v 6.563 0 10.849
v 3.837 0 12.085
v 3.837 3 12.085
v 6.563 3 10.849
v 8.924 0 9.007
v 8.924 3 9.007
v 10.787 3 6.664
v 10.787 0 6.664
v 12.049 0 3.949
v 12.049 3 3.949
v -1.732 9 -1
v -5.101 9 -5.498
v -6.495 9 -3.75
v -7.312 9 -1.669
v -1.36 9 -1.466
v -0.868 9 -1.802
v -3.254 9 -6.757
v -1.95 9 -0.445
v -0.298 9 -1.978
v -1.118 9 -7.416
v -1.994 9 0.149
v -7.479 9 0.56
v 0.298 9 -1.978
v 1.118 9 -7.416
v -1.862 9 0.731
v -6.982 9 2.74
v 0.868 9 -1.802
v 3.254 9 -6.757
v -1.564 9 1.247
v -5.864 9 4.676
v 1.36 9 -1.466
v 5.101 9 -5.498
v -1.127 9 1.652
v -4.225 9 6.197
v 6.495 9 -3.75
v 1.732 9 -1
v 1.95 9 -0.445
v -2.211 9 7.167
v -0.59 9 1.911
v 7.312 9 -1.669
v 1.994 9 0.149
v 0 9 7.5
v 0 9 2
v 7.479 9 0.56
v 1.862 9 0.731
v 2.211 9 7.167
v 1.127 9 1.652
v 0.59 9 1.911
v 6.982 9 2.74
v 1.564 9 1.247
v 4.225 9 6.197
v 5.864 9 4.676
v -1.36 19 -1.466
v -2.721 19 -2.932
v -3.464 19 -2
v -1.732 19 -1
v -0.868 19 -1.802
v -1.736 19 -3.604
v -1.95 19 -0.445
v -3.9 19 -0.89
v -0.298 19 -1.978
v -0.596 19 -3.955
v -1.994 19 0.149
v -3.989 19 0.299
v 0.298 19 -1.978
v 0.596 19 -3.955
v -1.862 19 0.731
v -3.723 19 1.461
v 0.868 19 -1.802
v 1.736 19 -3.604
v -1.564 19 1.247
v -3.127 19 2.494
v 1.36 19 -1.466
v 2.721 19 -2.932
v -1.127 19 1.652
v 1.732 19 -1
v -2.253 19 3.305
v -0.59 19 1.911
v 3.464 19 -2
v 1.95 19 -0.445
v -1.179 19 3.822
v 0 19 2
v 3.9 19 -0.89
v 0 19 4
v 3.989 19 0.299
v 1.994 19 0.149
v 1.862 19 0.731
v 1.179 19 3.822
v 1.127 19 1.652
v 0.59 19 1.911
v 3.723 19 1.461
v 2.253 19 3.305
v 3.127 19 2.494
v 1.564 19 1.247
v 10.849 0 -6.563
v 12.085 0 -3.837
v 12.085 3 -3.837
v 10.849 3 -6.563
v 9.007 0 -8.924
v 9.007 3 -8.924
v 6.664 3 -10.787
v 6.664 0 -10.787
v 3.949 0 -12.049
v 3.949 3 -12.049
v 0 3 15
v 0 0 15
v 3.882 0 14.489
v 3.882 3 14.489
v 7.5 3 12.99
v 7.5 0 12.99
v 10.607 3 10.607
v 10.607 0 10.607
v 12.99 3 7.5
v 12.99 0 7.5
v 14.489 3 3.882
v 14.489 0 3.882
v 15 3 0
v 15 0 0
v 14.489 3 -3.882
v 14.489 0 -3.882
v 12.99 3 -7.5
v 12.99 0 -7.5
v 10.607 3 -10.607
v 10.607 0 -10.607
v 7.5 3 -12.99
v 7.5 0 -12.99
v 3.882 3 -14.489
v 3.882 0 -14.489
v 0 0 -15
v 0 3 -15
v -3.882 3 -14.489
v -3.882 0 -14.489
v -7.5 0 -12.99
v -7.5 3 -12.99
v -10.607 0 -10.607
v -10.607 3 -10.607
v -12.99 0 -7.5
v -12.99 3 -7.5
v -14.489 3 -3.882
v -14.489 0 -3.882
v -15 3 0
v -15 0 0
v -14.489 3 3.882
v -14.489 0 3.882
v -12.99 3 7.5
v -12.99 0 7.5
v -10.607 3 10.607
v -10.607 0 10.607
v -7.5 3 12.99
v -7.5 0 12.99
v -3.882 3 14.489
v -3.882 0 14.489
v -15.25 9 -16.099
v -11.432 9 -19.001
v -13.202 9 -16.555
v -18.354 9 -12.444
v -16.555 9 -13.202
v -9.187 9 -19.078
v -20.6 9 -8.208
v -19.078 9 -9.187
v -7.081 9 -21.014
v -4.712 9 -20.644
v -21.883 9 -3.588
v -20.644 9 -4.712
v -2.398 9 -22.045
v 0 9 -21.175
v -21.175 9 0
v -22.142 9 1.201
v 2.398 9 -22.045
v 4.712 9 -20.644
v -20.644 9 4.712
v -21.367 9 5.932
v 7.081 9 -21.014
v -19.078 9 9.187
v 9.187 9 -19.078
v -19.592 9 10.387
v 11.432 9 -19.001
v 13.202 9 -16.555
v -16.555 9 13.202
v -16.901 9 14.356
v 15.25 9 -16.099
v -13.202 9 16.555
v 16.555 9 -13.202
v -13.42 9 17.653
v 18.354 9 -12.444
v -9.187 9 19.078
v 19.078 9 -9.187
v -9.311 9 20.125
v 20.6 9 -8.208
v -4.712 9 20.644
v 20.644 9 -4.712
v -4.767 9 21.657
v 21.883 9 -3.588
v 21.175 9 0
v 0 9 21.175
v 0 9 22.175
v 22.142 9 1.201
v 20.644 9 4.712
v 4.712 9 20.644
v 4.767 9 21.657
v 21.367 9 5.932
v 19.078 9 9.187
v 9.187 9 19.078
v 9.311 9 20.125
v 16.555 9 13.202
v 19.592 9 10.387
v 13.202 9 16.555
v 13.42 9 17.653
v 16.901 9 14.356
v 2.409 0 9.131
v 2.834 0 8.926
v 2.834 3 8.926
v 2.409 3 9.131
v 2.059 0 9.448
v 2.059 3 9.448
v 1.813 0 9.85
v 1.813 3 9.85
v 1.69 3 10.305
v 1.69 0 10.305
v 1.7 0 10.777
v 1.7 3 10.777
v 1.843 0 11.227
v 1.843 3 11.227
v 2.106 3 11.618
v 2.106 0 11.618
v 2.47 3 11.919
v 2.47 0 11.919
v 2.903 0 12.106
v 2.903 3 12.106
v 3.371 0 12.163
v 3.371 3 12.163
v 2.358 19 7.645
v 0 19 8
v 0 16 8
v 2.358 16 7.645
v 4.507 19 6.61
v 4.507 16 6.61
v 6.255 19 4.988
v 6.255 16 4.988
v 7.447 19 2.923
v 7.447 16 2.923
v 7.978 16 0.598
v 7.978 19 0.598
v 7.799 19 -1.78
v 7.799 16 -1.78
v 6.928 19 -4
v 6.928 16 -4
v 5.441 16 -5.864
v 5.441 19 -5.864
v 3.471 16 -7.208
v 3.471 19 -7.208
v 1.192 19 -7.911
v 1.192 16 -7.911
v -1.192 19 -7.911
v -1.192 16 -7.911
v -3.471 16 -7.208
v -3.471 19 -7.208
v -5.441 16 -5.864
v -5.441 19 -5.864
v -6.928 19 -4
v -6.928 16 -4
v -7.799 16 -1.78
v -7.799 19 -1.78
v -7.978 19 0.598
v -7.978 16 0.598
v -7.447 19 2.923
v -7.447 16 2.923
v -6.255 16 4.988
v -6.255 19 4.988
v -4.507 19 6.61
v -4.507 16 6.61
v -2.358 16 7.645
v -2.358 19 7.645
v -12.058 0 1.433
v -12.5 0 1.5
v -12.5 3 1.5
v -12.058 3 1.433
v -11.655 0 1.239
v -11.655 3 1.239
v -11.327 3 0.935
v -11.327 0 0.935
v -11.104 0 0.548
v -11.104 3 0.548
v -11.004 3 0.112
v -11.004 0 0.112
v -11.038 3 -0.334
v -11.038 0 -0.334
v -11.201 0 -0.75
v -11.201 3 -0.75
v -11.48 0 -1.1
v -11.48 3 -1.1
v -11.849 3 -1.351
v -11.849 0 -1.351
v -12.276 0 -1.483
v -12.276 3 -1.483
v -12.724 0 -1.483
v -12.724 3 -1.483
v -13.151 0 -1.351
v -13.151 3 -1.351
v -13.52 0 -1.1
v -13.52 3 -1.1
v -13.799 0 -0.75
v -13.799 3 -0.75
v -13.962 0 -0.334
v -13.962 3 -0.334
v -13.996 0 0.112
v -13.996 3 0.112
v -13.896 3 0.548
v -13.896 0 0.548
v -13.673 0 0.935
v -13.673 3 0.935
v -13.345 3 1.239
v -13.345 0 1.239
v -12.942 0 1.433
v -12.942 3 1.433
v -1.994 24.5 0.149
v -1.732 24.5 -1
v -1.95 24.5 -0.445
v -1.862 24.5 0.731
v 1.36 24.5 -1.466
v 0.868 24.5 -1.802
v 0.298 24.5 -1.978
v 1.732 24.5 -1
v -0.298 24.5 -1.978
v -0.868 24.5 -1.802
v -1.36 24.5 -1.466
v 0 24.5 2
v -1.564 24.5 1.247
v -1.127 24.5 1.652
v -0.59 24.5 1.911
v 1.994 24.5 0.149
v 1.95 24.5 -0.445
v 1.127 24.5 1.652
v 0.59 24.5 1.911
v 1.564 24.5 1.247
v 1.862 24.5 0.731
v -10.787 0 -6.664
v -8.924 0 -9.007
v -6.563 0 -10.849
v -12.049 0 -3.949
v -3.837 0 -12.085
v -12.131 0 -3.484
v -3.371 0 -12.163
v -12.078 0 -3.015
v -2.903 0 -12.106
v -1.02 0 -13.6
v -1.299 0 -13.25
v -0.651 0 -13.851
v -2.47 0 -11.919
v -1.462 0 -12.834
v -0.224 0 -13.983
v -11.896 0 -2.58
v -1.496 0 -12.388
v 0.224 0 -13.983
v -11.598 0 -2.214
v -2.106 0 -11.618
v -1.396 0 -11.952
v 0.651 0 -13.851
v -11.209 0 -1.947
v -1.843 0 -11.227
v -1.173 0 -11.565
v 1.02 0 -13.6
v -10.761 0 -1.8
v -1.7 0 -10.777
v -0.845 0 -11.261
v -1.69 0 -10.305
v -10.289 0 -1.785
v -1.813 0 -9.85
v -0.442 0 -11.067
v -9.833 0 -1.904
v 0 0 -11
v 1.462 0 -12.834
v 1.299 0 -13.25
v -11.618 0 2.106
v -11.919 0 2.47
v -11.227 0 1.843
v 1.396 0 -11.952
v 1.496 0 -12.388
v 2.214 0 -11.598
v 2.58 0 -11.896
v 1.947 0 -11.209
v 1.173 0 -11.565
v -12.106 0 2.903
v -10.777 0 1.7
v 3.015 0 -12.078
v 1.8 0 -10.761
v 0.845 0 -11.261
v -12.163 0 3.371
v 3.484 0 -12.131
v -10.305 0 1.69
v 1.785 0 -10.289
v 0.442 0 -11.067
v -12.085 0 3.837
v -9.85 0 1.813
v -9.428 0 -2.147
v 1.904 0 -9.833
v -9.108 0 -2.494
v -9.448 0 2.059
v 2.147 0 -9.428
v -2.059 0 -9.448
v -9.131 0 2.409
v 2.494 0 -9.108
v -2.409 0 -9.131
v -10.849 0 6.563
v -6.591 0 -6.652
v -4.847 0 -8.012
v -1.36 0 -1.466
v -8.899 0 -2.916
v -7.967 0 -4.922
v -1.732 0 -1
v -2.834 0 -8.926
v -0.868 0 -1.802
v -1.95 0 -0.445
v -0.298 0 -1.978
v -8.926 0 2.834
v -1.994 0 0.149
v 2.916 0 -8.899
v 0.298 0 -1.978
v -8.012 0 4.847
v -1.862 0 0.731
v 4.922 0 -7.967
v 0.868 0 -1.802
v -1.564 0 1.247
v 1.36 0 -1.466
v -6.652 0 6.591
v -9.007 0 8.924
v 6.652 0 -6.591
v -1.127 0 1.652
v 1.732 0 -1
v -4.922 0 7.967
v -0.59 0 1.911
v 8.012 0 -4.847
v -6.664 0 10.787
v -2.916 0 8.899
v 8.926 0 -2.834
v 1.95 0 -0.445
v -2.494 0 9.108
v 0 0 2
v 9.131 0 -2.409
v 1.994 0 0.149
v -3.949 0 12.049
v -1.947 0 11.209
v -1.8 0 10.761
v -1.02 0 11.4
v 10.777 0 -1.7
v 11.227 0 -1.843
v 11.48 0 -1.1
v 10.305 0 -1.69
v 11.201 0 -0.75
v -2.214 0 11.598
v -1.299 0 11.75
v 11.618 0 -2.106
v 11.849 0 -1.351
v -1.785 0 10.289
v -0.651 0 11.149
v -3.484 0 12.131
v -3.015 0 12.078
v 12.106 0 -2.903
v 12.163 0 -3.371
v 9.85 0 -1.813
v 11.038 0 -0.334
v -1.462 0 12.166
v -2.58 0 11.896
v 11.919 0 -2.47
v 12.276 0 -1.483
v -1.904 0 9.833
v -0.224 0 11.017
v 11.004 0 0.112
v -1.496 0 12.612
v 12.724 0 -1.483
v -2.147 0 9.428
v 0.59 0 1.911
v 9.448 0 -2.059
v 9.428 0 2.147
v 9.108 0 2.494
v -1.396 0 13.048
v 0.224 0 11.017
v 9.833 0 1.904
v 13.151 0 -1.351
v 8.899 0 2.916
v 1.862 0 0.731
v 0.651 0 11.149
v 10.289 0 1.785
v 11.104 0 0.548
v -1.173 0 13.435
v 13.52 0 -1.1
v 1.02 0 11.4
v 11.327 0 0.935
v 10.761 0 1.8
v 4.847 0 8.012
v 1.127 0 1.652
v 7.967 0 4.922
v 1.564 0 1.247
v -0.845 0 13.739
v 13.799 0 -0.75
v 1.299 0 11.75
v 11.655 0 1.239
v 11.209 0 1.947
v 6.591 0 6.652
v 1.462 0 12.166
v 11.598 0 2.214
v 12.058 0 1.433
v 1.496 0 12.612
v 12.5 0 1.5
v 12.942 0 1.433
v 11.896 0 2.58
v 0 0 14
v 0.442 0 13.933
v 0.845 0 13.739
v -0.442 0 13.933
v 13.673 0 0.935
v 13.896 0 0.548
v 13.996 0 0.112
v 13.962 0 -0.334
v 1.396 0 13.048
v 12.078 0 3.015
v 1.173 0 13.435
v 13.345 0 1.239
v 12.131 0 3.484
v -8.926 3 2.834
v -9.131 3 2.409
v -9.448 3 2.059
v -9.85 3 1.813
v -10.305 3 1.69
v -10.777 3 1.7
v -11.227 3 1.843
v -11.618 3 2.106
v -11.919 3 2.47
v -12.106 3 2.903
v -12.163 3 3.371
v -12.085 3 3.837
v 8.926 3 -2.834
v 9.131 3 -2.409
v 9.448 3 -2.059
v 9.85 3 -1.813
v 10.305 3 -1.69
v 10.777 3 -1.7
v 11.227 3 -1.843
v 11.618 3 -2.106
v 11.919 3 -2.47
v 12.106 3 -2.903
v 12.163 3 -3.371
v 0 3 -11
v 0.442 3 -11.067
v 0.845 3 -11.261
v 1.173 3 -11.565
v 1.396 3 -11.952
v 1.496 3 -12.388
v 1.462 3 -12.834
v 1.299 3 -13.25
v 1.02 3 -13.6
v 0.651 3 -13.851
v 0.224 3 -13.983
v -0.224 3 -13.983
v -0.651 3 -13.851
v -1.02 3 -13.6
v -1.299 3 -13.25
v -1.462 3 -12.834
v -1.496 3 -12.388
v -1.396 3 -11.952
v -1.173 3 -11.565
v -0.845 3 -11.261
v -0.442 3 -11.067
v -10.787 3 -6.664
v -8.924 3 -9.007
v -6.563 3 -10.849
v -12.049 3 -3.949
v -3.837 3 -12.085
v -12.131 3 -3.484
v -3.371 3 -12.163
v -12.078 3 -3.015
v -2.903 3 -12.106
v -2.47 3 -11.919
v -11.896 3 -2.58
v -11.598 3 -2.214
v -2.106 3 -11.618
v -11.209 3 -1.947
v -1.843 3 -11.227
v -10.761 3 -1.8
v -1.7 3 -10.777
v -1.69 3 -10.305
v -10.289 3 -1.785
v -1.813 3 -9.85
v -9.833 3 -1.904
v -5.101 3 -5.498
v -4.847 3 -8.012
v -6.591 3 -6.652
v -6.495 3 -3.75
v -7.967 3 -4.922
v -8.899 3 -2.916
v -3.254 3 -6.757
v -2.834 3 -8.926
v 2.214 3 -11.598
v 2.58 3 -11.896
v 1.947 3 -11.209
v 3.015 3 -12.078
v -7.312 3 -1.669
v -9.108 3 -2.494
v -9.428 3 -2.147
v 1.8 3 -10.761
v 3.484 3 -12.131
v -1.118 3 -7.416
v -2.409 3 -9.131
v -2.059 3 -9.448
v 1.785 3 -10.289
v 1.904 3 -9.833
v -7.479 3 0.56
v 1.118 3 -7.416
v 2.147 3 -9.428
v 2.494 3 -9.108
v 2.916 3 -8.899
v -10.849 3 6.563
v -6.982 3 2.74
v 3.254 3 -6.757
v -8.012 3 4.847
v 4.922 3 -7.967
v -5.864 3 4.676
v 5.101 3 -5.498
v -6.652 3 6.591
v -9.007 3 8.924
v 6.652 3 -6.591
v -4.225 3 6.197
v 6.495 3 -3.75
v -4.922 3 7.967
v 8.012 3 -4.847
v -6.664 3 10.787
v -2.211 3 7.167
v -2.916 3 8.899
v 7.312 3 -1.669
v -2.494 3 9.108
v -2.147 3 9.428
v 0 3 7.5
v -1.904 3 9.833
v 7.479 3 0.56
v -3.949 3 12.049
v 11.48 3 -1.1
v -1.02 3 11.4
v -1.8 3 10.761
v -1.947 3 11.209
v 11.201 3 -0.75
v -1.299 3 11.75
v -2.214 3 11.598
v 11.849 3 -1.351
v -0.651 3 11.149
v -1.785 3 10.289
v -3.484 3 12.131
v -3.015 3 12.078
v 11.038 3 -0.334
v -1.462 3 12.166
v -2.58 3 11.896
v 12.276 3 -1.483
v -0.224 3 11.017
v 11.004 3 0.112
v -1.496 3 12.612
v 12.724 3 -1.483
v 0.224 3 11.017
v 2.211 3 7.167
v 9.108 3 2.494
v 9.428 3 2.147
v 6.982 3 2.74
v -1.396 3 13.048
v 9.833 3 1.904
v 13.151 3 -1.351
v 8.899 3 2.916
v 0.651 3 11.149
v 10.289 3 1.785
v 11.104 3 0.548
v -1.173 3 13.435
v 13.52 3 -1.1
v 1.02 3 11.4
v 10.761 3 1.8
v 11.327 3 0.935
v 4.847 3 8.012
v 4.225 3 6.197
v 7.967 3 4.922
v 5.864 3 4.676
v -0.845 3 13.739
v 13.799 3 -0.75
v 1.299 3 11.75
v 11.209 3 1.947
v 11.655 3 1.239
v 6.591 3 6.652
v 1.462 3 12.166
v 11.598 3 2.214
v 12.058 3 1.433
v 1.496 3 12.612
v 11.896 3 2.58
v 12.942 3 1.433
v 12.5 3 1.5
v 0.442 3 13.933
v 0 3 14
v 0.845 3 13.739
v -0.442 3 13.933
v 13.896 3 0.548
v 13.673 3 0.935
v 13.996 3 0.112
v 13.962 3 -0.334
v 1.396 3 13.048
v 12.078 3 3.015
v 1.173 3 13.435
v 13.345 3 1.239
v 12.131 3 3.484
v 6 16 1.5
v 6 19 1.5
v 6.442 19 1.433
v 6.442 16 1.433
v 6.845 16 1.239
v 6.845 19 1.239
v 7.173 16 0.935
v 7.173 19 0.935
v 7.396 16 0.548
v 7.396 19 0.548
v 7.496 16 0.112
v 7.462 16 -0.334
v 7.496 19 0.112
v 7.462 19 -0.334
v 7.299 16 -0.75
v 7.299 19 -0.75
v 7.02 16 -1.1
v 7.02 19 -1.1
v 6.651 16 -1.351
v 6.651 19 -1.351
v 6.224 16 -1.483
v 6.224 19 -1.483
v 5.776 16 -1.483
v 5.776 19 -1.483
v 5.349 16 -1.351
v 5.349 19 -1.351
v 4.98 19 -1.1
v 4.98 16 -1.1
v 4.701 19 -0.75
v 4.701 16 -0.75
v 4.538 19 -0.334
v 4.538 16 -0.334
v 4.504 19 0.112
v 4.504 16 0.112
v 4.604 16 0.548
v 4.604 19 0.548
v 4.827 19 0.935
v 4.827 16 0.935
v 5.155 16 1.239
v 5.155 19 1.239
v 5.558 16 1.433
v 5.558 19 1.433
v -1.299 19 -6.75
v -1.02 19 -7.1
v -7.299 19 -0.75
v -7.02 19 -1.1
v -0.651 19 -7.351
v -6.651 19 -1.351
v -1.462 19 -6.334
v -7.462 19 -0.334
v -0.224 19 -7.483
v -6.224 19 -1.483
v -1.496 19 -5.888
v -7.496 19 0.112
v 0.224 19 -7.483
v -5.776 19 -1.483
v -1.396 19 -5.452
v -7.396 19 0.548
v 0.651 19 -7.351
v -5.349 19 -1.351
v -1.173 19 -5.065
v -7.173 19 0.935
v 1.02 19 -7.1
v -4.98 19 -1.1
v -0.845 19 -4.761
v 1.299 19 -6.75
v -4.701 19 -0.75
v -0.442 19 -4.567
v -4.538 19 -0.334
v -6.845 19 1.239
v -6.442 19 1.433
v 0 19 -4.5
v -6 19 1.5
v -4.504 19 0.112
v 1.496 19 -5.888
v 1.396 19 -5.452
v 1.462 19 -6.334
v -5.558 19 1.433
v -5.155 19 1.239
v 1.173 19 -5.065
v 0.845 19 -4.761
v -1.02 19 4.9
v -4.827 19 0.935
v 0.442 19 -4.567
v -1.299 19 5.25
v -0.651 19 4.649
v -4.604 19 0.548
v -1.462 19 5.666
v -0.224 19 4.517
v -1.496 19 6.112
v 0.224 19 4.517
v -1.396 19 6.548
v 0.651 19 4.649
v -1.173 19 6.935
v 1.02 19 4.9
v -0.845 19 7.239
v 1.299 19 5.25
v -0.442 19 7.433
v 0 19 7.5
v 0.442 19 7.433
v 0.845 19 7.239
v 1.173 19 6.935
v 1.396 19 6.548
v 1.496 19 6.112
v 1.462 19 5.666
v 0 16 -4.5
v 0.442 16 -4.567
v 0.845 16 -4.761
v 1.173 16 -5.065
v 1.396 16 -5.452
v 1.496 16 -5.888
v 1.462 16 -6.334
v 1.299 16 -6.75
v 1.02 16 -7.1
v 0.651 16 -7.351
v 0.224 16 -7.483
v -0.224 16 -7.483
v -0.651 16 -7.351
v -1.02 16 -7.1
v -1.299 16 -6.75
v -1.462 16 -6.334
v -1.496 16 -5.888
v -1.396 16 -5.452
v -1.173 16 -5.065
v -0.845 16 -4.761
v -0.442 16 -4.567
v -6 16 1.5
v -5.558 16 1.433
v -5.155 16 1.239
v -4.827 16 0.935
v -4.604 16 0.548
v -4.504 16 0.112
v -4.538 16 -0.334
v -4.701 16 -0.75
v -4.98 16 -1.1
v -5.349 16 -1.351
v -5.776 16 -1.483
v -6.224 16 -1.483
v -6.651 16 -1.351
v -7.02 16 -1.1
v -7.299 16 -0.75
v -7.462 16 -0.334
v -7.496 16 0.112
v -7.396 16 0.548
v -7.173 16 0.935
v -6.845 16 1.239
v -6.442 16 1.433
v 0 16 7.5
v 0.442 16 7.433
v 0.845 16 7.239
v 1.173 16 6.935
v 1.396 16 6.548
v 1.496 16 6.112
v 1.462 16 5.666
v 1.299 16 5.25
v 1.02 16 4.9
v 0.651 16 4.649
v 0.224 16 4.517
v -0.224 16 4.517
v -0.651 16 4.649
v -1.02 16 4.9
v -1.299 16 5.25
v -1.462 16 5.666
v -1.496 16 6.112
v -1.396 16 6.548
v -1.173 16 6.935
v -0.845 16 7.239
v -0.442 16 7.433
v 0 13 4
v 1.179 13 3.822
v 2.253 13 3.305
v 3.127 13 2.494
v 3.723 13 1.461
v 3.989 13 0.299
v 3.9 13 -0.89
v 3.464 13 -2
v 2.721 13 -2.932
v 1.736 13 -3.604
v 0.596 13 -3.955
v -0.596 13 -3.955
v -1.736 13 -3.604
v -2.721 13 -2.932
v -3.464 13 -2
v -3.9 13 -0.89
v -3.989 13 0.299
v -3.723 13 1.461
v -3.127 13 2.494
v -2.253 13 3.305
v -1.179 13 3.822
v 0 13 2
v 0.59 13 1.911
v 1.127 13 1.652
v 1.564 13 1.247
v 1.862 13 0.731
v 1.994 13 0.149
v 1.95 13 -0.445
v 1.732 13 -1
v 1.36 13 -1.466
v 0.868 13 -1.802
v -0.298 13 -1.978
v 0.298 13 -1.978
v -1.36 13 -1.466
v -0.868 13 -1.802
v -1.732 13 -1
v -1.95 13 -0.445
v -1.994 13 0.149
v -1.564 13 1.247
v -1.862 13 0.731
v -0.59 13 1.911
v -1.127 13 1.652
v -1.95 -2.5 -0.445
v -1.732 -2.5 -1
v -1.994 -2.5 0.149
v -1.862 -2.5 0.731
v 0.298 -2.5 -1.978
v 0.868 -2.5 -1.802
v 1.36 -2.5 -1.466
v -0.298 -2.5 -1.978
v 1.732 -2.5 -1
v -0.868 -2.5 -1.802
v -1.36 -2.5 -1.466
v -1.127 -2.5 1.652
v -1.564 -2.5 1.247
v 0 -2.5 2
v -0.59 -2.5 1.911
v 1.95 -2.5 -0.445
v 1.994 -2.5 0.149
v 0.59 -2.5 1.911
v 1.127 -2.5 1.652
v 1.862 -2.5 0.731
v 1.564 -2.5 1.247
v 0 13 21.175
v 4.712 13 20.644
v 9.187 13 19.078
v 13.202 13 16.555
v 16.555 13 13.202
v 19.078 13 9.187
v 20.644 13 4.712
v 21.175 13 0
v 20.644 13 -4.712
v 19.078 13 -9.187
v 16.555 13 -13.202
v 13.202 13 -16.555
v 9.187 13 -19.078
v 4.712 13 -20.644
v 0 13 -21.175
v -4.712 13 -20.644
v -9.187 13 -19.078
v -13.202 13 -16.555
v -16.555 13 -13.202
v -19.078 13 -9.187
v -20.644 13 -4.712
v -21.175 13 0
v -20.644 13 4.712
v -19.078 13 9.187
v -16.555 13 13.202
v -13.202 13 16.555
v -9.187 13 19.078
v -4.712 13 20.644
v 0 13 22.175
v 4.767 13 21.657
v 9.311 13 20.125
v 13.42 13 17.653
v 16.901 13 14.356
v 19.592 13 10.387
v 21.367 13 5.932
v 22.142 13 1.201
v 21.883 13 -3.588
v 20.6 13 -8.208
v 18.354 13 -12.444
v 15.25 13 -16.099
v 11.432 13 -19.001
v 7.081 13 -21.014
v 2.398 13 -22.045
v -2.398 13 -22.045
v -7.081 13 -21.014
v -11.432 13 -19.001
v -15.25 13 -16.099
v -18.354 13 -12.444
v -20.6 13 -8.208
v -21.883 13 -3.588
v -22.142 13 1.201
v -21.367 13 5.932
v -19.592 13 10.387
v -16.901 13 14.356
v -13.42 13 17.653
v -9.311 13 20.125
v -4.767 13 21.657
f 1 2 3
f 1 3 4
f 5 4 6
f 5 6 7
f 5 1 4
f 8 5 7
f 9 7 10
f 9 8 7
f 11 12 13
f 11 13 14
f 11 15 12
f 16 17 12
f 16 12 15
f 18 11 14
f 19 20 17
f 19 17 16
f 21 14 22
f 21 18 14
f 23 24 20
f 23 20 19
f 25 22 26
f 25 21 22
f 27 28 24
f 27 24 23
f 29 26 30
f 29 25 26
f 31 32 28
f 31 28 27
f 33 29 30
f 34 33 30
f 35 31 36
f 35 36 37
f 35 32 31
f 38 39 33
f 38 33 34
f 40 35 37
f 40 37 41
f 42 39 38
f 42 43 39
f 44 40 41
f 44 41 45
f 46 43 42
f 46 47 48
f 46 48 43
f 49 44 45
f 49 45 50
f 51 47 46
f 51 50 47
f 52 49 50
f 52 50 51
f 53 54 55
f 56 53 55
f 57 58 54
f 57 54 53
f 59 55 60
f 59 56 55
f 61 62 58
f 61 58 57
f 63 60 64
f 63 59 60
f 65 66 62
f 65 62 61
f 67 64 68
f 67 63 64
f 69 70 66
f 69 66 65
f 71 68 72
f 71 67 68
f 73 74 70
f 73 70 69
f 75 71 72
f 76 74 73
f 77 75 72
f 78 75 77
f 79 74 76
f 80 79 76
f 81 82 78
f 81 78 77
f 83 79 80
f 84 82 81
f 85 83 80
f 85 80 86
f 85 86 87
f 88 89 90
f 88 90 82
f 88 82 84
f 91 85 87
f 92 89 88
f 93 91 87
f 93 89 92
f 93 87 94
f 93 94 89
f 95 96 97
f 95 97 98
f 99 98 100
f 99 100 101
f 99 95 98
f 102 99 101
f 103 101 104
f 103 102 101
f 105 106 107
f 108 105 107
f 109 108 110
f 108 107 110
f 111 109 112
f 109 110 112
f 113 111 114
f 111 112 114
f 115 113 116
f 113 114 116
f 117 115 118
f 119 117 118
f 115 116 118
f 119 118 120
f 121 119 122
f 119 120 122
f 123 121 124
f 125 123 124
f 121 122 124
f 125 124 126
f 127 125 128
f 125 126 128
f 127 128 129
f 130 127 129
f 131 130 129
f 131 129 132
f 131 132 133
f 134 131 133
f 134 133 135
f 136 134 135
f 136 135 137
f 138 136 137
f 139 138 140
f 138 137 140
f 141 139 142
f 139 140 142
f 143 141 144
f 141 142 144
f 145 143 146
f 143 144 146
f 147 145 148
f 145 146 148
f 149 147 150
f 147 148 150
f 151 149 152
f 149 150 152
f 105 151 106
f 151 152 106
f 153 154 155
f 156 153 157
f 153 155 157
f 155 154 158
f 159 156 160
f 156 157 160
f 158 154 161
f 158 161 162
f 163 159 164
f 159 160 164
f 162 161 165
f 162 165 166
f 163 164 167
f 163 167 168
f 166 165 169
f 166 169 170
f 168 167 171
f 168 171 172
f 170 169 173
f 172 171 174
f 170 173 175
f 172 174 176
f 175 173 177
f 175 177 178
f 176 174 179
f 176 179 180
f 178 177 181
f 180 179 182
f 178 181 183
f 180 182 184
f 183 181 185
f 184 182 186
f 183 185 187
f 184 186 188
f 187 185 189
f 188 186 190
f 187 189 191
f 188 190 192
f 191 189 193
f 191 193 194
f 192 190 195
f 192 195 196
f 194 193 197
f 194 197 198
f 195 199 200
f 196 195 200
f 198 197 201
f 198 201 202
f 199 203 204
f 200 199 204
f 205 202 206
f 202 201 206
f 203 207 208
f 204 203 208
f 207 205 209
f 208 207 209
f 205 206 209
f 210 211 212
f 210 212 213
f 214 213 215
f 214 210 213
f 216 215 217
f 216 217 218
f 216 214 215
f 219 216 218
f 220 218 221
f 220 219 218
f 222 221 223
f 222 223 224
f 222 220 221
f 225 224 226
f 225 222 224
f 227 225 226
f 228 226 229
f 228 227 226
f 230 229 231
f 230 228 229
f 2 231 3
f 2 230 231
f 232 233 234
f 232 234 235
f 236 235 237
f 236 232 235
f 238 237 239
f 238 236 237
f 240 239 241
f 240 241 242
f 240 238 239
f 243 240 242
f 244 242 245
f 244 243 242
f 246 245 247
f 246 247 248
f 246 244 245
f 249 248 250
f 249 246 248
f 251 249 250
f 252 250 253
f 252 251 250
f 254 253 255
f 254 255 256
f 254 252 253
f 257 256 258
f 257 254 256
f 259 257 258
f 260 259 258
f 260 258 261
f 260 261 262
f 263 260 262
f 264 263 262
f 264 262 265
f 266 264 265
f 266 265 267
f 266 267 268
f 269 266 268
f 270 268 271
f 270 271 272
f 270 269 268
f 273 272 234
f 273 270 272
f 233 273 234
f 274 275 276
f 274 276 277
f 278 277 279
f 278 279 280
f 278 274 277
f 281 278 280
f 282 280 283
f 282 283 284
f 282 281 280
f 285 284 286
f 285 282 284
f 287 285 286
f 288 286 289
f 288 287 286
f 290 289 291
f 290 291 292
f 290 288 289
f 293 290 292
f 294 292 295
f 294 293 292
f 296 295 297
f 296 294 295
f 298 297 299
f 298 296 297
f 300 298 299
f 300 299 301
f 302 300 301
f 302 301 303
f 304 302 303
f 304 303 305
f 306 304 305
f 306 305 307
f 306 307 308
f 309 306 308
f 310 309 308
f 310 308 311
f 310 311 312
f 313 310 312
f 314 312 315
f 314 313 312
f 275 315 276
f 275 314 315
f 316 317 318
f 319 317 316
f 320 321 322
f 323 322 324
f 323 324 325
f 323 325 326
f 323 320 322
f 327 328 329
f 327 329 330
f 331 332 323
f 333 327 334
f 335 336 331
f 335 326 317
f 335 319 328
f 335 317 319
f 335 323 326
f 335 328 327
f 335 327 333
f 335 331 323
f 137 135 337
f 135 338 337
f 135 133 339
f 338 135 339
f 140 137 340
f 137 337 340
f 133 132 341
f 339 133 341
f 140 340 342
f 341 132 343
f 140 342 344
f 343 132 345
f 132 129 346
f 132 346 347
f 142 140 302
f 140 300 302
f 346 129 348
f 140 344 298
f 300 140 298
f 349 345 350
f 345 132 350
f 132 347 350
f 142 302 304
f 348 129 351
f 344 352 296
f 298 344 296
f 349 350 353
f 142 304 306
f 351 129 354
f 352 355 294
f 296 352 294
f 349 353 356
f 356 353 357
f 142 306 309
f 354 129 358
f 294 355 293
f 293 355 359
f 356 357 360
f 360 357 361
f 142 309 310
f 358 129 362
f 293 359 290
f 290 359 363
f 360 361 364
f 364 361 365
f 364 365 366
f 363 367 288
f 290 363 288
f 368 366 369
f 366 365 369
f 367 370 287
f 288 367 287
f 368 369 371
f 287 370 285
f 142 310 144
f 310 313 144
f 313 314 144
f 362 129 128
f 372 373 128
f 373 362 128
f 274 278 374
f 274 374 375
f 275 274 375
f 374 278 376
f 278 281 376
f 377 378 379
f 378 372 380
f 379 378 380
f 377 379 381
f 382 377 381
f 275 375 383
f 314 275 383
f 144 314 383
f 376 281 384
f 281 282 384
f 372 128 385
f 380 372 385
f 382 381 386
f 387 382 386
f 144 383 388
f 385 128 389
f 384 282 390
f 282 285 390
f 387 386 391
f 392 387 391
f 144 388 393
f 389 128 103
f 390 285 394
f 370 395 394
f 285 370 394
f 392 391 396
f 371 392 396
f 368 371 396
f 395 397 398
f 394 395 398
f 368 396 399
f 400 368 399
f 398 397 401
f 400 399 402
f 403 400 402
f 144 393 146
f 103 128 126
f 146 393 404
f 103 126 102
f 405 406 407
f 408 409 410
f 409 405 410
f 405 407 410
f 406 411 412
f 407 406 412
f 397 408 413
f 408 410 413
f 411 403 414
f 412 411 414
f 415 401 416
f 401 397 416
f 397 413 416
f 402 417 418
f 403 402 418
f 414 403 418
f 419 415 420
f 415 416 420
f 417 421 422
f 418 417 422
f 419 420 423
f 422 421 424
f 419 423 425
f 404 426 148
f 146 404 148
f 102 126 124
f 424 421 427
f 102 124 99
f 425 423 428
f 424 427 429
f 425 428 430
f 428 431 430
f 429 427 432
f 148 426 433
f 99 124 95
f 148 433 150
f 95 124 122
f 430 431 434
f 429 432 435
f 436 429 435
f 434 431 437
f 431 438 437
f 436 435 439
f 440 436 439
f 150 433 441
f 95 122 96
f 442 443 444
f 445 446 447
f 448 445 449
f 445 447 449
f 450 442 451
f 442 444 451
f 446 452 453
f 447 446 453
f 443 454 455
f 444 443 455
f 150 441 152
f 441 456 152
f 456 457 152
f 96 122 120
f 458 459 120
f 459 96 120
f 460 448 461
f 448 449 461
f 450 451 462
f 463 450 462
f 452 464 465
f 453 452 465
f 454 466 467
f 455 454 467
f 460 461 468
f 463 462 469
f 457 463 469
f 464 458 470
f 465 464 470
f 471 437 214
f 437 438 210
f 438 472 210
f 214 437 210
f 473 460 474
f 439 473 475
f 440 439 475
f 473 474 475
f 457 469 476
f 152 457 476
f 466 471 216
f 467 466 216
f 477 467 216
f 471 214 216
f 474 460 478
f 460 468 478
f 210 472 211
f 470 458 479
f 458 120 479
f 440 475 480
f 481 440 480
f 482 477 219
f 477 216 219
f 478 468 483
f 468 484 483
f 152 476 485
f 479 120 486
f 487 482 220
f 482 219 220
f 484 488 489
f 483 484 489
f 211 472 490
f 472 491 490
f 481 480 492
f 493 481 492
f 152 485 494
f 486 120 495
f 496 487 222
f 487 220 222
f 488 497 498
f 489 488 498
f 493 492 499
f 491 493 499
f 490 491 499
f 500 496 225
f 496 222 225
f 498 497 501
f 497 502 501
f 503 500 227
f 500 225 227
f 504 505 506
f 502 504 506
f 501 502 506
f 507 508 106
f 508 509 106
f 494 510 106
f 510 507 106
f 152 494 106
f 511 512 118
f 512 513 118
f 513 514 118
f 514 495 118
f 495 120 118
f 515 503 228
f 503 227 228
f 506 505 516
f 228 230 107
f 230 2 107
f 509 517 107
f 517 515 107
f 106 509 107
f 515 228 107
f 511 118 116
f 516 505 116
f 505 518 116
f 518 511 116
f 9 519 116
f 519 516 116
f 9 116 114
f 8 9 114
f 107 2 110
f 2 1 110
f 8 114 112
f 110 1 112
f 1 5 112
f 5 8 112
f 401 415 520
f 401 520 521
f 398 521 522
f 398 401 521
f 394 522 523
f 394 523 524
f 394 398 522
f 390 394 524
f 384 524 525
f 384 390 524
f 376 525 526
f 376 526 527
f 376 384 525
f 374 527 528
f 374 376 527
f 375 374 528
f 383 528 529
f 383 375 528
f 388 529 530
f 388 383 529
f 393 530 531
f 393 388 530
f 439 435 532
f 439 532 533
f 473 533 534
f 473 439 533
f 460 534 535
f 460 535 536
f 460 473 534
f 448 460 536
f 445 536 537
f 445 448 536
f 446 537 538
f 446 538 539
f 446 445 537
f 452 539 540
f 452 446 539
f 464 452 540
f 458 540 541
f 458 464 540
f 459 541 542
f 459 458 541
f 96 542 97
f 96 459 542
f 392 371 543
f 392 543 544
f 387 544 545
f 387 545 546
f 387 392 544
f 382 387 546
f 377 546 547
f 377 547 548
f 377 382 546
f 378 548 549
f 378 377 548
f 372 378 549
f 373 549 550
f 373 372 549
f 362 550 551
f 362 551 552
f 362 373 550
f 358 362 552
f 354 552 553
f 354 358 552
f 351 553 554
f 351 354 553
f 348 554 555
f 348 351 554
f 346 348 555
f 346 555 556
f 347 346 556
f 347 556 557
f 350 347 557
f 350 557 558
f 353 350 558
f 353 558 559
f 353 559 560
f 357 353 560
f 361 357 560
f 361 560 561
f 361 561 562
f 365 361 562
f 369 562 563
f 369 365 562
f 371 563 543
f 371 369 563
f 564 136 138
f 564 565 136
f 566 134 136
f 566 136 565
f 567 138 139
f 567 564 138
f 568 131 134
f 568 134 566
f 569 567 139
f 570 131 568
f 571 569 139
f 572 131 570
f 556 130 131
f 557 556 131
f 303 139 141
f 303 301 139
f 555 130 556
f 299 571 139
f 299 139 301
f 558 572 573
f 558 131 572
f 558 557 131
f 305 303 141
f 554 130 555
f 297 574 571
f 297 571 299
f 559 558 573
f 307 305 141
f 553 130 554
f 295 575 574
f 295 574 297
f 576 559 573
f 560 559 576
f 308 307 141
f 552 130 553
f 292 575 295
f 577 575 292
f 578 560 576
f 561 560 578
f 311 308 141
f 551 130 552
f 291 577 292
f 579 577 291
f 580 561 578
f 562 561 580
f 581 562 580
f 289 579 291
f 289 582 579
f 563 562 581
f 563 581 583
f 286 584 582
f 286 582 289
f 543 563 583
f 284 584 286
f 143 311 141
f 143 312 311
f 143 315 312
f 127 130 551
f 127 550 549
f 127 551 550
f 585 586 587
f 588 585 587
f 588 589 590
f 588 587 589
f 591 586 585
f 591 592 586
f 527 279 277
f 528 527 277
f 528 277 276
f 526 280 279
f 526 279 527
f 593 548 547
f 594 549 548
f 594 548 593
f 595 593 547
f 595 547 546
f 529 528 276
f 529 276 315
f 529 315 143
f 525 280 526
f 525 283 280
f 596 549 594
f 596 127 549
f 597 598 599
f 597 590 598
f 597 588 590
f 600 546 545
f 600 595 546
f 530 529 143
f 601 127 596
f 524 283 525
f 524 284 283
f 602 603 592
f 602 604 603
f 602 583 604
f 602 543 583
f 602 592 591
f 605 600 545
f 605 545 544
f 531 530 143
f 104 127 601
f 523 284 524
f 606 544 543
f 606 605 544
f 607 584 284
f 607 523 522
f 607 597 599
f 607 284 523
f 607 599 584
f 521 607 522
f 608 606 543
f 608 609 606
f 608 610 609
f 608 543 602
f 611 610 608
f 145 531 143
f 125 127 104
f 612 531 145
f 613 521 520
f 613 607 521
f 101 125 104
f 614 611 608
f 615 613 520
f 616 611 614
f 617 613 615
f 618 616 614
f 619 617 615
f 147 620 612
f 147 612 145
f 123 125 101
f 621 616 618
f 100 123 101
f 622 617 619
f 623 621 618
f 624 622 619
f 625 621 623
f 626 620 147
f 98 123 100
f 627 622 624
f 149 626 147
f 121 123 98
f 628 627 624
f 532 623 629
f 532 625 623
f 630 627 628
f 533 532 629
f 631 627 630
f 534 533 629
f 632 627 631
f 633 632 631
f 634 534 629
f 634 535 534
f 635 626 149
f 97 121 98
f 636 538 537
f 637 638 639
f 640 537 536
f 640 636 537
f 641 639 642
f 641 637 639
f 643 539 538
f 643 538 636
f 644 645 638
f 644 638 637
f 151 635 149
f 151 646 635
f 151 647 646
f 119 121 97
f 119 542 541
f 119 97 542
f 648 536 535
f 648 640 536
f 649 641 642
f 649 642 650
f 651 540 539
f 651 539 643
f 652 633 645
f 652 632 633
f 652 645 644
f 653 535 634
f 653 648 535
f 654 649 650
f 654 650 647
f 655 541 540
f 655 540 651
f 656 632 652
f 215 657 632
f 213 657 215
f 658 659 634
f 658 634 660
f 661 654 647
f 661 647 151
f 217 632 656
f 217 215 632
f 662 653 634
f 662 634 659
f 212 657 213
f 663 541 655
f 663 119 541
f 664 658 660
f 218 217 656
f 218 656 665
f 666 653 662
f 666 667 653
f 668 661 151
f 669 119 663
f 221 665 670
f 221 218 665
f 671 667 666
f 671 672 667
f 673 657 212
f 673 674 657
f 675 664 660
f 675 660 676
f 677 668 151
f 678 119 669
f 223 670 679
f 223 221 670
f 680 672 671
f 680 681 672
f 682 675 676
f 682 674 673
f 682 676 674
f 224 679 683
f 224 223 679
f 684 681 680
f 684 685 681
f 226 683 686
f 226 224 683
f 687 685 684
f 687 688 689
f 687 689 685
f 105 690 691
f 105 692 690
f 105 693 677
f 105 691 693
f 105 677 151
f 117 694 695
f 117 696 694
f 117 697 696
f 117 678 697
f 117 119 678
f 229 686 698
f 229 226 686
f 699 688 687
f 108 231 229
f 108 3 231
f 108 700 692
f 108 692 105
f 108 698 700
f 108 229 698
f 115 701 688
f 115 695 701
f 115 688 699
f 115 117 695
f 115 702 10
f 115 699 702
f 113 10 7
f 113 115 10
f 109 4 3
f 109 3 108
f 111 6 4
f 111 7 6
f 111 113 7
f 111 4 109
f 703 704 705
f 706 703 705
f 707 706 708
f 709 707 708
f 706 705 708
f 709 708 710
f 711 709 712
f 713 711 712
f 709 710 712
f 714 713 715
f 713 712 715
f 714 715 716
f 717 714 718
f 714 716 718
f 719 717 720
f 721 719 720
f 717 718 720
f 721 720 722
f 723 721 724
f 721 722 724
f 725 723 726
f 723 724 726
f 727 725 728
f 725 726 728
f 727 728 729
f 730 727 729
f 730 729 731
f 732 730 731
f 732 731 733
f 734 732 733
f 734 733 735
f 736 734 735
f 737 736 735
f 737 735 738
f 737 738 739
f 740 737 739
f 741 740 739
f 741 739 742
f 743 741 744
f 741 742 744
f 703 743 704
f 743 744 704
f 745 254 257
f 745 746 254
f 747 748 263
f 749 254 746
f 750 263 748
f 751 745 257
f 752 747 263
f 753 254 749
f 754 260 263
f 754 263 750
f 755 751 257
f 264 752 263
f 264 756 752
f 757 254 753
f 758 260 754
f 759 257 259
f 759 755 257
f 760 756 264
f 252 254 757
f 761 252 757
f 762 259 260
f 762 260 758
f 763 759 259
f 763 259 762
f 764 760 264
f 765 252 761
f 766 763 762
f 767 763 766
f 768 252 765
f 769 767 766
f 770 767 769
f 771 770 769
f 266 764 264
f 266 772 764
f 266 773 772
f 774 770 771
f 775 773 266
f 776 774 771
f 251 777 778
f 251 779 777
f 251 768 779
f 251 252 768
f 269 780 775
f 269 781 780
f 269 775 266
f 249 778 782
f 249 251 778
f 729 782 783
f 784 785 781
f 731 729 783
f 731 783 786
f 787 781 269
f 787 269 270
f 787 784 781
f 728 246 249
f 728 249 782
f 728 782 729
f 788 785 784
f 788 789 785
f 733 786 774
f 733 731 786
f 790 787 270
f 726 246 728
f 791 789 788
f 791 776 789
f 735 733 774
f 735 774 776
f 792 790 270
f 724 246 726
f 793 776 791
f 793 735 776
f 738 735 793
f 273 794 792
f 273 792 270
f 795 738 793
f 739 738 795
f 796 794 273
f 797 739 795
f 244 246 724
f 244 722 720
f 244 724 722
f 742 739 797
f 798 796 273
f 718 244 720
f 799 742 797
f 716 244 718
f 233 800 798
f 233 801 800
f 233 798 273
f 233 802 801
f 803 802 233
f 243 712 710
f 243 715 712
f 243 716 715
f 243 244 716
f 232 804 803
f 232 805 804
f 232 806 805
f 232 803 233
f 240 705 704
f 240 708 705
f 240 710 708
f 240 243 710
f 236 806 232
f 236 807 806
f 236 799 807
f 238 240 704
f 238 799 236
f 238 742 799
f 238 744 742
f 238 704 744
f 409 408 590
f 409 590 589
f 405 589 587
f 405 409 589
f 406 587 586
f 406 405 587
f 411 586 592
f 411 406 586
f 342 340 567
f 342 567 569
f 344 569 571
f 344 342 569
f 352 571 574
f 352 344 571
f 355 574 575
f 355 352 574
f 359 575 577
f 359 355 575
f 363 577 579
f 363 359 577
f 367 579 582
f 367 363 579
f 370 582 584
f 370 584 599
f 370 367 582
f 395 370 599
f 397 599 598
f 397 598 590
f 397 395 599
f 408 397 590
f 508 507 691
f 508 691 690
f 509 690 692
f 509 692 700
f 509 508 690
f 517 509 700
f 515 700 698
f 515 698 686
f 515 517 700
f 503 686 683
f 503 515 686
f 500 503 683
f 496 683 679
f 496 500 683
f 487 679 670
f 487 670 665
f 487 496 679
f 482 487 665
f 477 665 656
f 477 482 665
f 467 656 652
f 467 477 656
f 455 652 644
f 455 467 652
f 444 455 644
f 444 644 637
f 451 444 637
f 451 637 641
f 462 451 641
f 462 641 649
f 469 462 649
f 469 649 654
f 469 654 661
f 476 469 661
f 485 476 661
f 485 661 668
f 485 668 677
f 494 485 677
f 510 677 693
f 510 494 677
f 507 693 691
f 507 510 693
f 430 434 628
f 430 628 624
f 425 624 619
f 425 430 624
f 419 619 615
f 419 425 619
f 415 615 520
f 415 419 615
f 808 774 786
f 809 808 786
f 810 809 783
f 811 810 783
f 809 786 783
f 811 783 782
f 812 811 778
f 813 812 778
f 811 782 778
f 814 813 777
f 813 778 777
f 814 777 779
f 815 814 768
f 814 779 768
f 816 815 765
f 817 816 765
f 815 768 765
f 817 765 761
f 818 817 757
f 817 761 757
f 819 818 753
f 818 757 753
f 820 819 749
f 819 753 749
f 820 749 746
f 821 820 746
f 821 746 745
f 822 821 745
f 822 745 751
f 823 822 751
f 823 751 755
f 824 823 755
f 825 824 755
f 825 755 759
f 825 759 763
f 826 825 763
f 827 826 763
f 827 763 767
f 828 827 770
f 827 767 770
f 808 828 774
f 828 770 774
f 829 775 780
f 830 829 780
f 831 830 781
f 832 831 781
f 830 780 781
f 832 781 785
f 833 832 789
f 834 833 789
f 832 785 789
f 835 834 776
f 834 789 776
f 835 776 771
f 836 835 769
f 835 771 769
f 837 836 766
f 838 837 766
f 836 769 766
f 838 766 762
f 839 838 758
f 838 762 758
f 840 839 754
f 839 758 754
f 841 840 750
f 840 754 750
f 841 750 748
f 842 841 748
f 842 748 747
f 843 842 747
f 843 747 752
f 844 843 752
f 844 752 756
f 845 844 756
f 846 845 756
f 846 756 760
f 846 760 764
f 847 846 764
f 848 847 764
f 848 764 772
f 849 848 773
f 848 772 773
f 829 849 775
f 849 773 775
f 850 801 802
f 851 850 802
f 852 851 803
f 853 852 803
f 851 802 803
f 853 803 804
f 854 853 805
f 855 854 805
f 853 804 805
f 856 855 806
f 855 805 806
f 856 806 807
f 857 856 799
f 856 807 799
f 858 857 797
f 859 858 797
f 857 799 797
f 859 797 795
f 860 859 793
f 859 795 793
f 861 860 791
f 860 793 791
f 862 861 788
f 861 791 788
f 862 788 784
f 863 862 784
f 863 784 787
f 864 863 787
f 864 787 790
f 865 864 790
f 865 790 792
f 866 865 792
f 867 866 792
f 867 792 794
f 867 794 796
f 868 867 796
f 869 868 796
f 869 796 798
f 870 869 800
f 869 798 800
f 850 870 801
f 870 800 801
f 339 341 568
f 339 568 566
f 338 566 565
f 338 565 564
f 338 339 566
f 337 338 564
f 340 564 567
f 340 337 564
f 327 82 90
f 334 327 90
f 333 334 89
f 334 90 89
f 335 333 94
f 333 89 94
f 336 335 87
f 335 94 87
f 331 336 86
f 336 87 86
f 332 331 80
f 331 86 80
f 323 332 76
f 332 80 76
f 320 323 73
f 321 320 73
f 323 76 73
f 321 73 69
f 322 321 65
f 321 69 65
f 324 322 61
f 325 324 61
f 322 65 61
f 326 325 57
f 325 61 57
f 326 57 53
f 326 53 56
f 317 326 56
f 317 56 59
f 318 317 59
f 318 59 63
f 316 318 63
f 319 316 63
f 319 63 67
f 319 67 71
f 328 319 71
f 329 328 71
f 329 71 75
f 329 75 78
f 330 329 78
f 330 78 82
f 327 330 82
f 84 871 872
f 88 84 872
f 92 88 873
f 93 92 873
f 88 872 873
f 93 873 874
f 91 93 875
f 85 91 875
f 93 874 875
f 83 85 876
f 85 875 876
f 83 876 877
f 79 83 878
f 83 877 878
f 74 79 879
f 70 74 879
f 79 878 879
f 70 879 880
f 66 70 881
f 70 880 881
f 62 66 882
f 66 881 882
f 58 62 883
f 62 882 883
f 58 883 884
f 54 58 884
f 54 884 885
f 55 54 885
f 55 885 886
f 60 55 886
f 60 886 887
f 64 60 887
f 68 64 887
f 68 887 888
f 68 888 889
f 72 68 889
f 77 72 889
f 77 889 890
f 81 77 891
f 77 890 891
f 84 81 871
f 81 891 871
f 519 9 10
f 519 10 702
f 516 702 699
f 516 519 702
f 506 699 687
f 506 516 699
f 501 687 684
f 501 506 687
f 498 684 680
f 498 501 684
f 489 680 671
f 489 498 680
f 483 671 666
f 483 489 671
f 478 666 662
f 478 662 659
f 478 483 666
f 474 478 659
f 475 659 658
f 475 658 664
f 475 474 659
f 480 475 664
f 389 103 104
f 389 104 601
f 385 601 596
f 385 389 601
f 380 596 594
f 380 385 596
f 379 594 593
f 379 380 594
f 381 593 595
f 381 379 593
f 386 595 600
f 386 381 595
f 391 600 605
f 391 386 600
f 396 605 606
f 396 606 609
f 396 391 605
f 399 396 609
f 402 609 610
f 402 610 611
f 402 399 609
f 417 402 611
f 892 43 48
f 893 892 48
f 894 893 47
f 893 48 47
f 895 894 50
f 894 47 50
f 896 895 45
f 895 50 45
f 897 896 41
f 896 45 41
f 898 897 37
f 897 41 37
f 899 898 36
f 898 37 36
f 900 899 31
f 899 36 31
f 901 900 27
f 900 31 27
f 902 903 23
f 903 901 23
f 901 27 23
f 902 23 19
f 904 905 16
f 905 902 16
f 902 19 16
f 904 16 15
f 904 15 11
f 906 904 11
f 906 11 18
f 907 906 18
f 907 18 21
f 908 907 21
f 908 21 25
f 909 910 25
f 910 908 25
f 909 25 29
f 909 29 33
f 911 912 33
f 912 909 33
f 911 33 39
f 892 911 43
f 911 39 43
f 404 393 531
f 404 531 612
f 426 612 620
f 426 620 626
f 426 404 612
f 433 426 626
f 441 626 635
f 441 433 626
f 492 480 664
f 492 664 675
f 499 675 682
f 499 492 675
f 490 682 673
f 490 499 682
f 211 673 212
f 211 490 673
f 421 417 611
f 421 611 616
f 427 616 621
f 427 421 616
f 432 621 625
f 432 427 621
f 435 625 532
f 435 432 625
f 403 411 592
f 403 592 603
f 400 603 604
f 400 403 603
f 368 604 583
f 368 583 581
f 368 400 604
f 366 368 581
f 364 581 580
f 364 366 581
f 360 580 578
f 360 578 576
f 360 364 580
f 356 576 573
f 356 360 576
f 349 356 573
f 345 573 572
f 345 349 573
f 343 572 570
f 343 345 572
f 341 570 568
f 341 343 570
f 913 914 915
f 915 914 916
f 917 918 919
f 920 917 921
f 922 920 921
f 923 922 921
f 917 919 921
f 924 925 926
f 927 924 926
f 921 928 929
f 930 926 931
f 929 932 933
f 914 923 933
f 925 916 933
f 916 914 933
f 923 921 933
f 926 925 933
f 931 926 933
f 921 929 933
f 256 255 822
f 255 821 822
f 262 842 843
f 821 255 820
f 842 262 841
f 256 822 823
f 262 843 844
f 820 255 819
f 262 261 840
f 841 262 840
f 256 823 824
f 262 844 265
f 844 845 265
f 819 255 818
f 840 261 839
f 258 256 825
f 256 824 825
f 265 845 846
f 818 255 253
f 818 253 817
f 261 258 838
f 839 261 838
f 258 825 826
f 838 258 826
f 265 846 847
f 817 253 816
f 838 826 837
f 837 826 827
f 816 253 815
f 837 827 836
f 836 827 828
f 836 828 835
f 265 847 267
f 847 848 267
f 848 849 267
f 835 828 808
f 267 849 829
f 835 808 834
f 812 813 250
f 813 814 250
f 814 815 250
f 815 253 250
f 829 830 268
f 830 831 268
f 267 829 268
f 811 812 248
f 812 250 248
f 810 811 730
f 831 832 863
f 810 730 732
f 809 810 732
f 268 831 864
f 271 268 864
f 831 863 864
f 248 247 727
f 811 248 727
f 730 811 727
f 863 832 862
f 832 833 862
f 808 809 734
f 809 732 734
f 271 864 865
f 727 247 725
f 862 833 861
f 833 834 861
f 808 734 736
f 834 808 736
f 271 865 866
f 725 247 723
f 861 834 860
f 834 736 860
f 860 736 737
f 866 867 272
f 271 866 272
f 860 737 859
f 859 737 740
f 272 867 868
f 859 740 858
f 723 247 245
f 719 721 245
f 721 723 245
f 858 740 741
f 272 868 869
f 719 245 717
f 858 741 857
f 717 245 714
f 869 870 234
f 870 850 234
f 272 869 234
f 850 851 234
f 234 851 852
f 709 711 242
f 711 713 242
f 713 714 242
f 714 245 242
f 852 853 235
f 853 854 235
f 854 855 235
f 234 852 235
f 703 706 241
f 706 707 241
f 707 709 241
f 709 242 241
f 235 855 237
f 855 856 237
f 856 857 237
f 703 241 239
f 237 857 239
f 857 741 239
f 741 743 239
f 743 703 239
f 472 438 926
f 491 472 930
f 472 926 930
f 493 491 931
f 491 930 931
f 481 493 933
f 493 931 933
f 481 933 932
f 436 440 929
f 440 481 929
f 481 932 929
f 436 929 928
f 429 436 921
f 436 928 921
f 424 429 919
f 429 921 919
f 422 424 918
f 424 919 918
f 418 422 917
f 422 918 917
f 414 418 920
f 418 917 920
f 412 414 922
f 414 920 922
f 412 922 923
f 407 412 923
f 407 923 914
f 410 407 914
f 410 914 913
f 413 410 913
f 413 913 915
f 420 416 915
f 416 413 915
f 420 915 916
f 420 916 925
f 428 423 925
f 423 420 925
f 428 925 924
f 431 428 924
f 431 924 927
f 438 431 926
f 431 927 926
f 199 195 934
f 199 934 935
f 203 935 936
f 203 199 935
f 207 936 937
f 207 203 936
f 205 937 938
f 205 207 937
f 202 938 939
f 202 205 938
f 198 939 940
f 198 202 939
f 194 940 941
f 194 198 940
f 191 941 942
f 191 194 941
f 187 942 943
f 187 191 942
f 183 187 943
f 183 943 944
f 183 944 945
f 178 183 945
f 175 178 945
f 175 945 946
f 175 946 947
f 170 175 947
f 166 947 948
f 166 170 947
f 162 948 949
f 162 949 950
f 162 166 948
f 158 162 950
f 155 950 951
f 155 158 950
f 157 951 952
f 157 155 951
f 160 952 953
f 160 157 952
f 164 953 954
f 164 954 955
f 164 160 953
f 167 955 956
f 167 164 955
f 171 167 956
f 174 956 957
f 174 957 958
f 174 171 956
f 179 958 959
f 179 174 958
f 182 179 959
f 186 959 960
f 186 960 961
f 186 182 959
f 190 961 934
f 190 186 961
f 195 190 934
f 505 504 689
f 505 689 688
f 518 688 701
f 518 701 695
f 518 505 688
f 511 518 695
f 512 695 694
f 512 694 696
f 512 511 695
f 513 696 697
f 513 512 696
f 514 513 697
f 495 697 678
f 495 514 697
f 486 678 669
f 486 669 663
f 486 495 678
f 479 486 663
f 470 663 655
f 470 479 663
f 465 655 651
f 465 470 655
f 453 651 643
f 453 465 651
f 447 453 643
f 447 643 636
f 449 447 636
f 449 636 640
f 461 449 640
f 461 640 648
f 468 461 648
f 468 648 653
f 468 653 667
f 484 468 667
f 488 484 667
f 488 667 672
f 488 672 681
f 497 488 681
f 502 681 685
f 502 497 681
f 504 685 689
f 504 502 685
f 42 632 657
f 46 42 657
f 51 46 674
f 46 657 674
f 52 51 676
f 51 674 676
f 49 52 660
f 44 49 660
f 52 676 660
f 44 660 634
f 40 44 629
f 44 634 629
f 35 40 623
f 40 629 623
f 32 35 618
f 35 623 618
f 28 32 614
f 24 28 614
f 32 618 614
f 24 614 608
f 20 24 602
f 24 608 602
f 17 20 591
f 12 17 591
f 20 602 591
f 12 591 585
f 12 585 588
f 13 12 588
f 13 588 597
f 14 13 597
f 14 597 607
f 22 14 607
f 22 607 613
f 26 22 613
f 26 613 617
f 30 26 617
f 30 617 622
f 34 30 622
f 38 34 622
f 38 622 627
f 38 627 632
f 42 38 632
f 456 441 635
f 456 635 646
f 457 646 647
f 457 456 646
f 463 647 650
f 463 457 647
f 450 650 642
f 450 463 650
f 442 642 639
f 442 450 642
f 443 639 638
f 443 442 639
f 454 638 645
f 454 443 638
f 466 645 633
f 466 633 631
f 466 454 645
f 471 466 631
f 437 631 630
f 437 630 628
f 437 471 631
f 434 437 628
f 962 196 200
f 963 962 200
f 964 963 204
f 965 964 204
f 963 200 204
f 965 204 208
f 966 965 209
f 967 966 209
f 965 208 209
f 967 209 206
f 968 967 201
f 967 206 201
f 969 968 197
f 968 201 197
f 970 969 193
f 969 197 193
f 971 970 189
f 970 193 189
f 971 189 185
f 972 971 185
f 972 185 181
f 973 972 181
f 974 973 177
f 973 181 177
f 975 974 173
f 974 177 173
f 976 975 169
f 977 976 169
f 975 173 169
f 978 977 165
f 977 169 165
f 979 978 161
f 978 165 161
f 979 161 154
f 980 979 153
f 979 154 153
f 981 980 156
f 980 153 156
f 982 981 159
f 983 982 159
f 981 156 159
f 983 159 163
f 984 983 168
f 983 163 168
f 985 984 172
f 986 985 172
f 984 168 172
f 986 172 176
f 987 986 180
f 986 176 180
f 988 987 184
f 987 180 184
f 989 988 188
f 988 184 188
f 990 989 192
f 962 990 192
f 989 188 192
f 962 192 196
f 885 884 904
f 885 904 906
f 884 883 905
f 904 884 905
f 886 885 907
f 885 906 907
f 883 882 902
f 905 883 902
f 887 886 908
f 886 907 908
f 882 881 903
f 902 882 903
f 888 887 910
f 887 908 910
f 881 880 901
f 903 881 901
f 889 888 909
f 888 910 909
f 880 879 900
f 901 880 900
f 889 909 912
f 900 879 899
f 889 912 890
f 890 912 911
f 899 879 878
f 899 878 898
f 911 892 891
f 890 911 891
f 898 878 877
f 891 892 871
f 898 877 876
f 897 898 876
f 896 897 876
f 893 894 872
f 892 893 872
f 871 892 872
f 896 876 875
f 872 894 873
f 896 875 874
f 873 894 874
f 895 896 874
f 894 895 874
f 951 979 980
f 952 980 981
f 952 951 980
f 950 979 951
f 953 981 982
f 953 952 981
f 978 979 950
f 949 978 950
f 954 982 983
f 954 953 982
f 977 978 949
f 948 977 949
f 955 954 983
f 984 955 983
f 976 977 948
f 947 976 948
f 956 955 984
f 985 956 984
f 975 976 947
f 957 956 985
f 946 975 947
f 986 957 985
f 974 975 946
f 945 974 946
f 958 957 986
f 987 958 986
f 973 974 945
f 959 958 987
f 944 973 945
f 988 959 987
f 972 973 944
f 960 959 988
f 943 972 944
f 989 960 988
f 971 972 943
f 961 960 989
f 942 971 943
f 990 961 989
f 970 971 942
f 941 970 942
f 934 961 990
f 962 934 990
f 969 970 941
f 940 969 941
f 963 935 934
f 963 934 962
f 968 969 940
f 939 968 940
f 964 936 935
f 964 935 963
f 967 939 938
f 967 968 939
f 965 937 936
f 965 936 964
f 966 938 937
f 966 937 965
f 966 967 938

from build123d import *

# Parameters (mm, degrees)
BOSS_EXTRUDE3_DEPTH      = 24.5
BOSS_EXTRUDE3_DEPTH_BACK = 2.5
SKETCH1_R                = 2
SKETCH1_6_R              = 7.5
BOSS_EXTRUDE4_DEPTH      = 9
SKETCH1_8_R              = 15
SKETCH1_8_R_2            = 1.5
SKETCH1_8_R_3            = 7.5
BOSS_EXTRUDE5_DEPTH      = 3
SKETCH3_R                = 22.175
SKETCH3_R_2              = 21.175
BOSS_EXTRUDE6_DEPTH      = 4
SKETCH4_R                = 4
BOSS_EXTRUDE7_DEPTH      = 6
SKETCH5_R                = 8
SKETCH5_R_2              = 1.5
BOSS_EXTRUDE8_DEPTH      = 3


with BuildPart() as part:
    # Sketch1 → Boss-Extrude3 (new, two sides: drawn at the far end of the back side and taken through both)
    with BuildSketch(Plane(origin=(0, 0, 0), x_dir=(1, 0, 0), z_dir=(0, 1, 0)).offset(-BOSS_EXTRUDE3_DEPTH_BACK)):
        Circle(SKETCH1_R)
    extrude(amount=BOSS_EXTRUDE3_DEPTH + BOSS_EXTRUDE3_DEPTH_BACK)



with BuildPart() as body_2:
    # Sketch1<6> → Boss-Extrude4 (new body)
    with BuildSketch(Plane(origin=(0, 0, 0), x_dir=(1, 0, 0), z_dir=(0, 1, 0))):
        Circle(SKETCH1_6_R)
    extrude(amount=BOSS_EXTRUDE4_DEPTH)


with BuildPart() as part_1:
    add(part.part)

    add(body_2.part)  # Boss-Extrude5 merges body 2
    # Sketch1<8> → Boss-Extrude5 (add)
    with BuildSketch(Plane(origin=(0, 0, 0), x_dir=(1, 0, 0), z_dir=(0, 1, 0))):
        Circle(SKETCH1_8_R)
        with Locations((-12.5, 0)):
            Circle(SKETCH1_8_R_2, mode=Mode.SUBTRACT)
        with BuildLine():
            ThreePointArc((-3.948750659, -12.04910118), (-9.007445058, -8.924091244), (-12.085290806, -3.836563193))
            ThreePointArc((-12.085290806, -3.836563193), (-11.006987994, -1.755202195), (-8.925626996, -2.833505007))
            ThreePointArc((-8.925626996, -2.833505007), (-6.652474985, -6.590913781), (-2.916361389, -8.898899041))
            ThreePointArc((-2.916361389, -8.898899041), (-1.857454955, -10.990194746), (-3.948750659, -12.04910118))
        make_face(mode=Mode.SUBTRACT)
        with Locations((0, -12.5)):
            Circle(SKETCH1_8_R_2, mode=Mode.SUBTRACT)
        with BuildLine():
            ThreePointArc((12.04910118, -3.948750659), (8.924091244, -9.007445058), (3.836563193, -12.085290806))
            ThreePointArc((3.836563193, -12.085290806), (1.755202195, -11.006987994), (2.833505007, -8.925626996))
            ThreePointArc((2.833505007, -8.925626996), (6.590913781, -6.652474985), (8.898899041, -2.916361389))
            ThreePointArc((8.898899041, -2.916361389), (10.990194746, -1.857454955), (12.04910118, -3.948750659))
        make_face(mode=Mode.SUBTRACT)
        with BuildLine():
            ThreePointArc((-12.04910118, 3.948750659), (-8.924091244, 9.007445058), (-3.836563193, 12.085290806))
            ThreePointArc((-3.836563193, 12.085290806), (-1.755202195, 11.006987994), (-2.833505007, 8.925626996))
            ThreePointArc((-2.833505007, 8.925626996), (-6.590913781, 6.652474985), (-8.898899041, 2.916361389))
            ThreePointArc((-8.898899041, 2.916361389), (-10.990194746, 1.857454955), (-12.04910118, 3.948750659))
        make_face(mode=Mode.SUBTRACT)
        Circle(SKETCH1_8_R_3, mode=Mode.SUBTRACT)
        with BuildLine():
            ThreePointArc((3.948750659, 12.04910118), (9.007445058, 8.924091244), (12.085290806, 3.836563193))
            ThreePointArc((12.085290806, 3.836563193), (11.006987994, 1.755202195), (8.925626996, 2.833505007))
            ThreePointArc((8.925626996, 2.833505007), (6.652474985, 6.590913781), (2.916361389, 8.898899041))
            ThreePointArc((2.916361389, 8.898899041), (1.857454955, 10.990194746), (3.948750659, 12.04910118))
        make_face(mode=Mode.SUBTRACT)
        with Locations((12.5, 0)):
            Circle(SKETCH1_8_R_2, mode=Mode.SUBTRACT)
        with Locations((0, 12.5)):
            Circle(SKETCH1_8_R_2, mode=Mode.SUBTRACT)
    extrude(amount=BOSS_EXTRUDE5_DEPTH)

    # Sketch4 → Boss-Extrude7 (add)
    with BuildSketch(Plane(origin=(0, 13, 0), x_dir=(1, 0, 0), z_dir=(0, 1, 0))):
        Circle(SKETCH4_R)
    extrude(amount=BOSS_EXTRUDE7_DEPTH)


with BuildPart() as body_2_2:
    # Sketch3 → Boss-Extrude6 (new body)
    with BuildSketch(Plane(origin=(0, 9, 0), x_dir=(1, 0, 0), z_dir=(0, 1, 0))):
        Circle(SKETCH3_R)
        Circle(SKETCH3_R_2, mode=Mode.SUBTRACT)
    extrude(amount=BOSS_EXTRUDE6_DEPTH)


with BuildPart() as body_3:
    # Sketch5 → Boss-Extrude8 (new body)
    with BuildSketch(Plane(origin=(0, 19, 0), x_dir=(1, 0, 0), z_dir=(0, 1, 0))):
        Circle(SKETCH5_R)
        with Locations((-6, 0)):
            Circle(SKETCH5_R_2, mode=Mode.SUBTRACT)
        with Locations((0, 6)):
            Circle(SKETCH5_R_2, mode=Mode.SUBTRACT)
        with Locations((6, 0)):
            Circle(SKETCH5_R_2, mode=Mode.SUBTRACT)
        with Locations((0, -6)):
            Circle(SKETCH5_R_2, mode=Mode.SUBTRACT)
    extrude(amount=-BOSS_EXTRUDE8_DEPTH)


solid = Compound([part_1.part, body_2_2.part, body_3.part])
